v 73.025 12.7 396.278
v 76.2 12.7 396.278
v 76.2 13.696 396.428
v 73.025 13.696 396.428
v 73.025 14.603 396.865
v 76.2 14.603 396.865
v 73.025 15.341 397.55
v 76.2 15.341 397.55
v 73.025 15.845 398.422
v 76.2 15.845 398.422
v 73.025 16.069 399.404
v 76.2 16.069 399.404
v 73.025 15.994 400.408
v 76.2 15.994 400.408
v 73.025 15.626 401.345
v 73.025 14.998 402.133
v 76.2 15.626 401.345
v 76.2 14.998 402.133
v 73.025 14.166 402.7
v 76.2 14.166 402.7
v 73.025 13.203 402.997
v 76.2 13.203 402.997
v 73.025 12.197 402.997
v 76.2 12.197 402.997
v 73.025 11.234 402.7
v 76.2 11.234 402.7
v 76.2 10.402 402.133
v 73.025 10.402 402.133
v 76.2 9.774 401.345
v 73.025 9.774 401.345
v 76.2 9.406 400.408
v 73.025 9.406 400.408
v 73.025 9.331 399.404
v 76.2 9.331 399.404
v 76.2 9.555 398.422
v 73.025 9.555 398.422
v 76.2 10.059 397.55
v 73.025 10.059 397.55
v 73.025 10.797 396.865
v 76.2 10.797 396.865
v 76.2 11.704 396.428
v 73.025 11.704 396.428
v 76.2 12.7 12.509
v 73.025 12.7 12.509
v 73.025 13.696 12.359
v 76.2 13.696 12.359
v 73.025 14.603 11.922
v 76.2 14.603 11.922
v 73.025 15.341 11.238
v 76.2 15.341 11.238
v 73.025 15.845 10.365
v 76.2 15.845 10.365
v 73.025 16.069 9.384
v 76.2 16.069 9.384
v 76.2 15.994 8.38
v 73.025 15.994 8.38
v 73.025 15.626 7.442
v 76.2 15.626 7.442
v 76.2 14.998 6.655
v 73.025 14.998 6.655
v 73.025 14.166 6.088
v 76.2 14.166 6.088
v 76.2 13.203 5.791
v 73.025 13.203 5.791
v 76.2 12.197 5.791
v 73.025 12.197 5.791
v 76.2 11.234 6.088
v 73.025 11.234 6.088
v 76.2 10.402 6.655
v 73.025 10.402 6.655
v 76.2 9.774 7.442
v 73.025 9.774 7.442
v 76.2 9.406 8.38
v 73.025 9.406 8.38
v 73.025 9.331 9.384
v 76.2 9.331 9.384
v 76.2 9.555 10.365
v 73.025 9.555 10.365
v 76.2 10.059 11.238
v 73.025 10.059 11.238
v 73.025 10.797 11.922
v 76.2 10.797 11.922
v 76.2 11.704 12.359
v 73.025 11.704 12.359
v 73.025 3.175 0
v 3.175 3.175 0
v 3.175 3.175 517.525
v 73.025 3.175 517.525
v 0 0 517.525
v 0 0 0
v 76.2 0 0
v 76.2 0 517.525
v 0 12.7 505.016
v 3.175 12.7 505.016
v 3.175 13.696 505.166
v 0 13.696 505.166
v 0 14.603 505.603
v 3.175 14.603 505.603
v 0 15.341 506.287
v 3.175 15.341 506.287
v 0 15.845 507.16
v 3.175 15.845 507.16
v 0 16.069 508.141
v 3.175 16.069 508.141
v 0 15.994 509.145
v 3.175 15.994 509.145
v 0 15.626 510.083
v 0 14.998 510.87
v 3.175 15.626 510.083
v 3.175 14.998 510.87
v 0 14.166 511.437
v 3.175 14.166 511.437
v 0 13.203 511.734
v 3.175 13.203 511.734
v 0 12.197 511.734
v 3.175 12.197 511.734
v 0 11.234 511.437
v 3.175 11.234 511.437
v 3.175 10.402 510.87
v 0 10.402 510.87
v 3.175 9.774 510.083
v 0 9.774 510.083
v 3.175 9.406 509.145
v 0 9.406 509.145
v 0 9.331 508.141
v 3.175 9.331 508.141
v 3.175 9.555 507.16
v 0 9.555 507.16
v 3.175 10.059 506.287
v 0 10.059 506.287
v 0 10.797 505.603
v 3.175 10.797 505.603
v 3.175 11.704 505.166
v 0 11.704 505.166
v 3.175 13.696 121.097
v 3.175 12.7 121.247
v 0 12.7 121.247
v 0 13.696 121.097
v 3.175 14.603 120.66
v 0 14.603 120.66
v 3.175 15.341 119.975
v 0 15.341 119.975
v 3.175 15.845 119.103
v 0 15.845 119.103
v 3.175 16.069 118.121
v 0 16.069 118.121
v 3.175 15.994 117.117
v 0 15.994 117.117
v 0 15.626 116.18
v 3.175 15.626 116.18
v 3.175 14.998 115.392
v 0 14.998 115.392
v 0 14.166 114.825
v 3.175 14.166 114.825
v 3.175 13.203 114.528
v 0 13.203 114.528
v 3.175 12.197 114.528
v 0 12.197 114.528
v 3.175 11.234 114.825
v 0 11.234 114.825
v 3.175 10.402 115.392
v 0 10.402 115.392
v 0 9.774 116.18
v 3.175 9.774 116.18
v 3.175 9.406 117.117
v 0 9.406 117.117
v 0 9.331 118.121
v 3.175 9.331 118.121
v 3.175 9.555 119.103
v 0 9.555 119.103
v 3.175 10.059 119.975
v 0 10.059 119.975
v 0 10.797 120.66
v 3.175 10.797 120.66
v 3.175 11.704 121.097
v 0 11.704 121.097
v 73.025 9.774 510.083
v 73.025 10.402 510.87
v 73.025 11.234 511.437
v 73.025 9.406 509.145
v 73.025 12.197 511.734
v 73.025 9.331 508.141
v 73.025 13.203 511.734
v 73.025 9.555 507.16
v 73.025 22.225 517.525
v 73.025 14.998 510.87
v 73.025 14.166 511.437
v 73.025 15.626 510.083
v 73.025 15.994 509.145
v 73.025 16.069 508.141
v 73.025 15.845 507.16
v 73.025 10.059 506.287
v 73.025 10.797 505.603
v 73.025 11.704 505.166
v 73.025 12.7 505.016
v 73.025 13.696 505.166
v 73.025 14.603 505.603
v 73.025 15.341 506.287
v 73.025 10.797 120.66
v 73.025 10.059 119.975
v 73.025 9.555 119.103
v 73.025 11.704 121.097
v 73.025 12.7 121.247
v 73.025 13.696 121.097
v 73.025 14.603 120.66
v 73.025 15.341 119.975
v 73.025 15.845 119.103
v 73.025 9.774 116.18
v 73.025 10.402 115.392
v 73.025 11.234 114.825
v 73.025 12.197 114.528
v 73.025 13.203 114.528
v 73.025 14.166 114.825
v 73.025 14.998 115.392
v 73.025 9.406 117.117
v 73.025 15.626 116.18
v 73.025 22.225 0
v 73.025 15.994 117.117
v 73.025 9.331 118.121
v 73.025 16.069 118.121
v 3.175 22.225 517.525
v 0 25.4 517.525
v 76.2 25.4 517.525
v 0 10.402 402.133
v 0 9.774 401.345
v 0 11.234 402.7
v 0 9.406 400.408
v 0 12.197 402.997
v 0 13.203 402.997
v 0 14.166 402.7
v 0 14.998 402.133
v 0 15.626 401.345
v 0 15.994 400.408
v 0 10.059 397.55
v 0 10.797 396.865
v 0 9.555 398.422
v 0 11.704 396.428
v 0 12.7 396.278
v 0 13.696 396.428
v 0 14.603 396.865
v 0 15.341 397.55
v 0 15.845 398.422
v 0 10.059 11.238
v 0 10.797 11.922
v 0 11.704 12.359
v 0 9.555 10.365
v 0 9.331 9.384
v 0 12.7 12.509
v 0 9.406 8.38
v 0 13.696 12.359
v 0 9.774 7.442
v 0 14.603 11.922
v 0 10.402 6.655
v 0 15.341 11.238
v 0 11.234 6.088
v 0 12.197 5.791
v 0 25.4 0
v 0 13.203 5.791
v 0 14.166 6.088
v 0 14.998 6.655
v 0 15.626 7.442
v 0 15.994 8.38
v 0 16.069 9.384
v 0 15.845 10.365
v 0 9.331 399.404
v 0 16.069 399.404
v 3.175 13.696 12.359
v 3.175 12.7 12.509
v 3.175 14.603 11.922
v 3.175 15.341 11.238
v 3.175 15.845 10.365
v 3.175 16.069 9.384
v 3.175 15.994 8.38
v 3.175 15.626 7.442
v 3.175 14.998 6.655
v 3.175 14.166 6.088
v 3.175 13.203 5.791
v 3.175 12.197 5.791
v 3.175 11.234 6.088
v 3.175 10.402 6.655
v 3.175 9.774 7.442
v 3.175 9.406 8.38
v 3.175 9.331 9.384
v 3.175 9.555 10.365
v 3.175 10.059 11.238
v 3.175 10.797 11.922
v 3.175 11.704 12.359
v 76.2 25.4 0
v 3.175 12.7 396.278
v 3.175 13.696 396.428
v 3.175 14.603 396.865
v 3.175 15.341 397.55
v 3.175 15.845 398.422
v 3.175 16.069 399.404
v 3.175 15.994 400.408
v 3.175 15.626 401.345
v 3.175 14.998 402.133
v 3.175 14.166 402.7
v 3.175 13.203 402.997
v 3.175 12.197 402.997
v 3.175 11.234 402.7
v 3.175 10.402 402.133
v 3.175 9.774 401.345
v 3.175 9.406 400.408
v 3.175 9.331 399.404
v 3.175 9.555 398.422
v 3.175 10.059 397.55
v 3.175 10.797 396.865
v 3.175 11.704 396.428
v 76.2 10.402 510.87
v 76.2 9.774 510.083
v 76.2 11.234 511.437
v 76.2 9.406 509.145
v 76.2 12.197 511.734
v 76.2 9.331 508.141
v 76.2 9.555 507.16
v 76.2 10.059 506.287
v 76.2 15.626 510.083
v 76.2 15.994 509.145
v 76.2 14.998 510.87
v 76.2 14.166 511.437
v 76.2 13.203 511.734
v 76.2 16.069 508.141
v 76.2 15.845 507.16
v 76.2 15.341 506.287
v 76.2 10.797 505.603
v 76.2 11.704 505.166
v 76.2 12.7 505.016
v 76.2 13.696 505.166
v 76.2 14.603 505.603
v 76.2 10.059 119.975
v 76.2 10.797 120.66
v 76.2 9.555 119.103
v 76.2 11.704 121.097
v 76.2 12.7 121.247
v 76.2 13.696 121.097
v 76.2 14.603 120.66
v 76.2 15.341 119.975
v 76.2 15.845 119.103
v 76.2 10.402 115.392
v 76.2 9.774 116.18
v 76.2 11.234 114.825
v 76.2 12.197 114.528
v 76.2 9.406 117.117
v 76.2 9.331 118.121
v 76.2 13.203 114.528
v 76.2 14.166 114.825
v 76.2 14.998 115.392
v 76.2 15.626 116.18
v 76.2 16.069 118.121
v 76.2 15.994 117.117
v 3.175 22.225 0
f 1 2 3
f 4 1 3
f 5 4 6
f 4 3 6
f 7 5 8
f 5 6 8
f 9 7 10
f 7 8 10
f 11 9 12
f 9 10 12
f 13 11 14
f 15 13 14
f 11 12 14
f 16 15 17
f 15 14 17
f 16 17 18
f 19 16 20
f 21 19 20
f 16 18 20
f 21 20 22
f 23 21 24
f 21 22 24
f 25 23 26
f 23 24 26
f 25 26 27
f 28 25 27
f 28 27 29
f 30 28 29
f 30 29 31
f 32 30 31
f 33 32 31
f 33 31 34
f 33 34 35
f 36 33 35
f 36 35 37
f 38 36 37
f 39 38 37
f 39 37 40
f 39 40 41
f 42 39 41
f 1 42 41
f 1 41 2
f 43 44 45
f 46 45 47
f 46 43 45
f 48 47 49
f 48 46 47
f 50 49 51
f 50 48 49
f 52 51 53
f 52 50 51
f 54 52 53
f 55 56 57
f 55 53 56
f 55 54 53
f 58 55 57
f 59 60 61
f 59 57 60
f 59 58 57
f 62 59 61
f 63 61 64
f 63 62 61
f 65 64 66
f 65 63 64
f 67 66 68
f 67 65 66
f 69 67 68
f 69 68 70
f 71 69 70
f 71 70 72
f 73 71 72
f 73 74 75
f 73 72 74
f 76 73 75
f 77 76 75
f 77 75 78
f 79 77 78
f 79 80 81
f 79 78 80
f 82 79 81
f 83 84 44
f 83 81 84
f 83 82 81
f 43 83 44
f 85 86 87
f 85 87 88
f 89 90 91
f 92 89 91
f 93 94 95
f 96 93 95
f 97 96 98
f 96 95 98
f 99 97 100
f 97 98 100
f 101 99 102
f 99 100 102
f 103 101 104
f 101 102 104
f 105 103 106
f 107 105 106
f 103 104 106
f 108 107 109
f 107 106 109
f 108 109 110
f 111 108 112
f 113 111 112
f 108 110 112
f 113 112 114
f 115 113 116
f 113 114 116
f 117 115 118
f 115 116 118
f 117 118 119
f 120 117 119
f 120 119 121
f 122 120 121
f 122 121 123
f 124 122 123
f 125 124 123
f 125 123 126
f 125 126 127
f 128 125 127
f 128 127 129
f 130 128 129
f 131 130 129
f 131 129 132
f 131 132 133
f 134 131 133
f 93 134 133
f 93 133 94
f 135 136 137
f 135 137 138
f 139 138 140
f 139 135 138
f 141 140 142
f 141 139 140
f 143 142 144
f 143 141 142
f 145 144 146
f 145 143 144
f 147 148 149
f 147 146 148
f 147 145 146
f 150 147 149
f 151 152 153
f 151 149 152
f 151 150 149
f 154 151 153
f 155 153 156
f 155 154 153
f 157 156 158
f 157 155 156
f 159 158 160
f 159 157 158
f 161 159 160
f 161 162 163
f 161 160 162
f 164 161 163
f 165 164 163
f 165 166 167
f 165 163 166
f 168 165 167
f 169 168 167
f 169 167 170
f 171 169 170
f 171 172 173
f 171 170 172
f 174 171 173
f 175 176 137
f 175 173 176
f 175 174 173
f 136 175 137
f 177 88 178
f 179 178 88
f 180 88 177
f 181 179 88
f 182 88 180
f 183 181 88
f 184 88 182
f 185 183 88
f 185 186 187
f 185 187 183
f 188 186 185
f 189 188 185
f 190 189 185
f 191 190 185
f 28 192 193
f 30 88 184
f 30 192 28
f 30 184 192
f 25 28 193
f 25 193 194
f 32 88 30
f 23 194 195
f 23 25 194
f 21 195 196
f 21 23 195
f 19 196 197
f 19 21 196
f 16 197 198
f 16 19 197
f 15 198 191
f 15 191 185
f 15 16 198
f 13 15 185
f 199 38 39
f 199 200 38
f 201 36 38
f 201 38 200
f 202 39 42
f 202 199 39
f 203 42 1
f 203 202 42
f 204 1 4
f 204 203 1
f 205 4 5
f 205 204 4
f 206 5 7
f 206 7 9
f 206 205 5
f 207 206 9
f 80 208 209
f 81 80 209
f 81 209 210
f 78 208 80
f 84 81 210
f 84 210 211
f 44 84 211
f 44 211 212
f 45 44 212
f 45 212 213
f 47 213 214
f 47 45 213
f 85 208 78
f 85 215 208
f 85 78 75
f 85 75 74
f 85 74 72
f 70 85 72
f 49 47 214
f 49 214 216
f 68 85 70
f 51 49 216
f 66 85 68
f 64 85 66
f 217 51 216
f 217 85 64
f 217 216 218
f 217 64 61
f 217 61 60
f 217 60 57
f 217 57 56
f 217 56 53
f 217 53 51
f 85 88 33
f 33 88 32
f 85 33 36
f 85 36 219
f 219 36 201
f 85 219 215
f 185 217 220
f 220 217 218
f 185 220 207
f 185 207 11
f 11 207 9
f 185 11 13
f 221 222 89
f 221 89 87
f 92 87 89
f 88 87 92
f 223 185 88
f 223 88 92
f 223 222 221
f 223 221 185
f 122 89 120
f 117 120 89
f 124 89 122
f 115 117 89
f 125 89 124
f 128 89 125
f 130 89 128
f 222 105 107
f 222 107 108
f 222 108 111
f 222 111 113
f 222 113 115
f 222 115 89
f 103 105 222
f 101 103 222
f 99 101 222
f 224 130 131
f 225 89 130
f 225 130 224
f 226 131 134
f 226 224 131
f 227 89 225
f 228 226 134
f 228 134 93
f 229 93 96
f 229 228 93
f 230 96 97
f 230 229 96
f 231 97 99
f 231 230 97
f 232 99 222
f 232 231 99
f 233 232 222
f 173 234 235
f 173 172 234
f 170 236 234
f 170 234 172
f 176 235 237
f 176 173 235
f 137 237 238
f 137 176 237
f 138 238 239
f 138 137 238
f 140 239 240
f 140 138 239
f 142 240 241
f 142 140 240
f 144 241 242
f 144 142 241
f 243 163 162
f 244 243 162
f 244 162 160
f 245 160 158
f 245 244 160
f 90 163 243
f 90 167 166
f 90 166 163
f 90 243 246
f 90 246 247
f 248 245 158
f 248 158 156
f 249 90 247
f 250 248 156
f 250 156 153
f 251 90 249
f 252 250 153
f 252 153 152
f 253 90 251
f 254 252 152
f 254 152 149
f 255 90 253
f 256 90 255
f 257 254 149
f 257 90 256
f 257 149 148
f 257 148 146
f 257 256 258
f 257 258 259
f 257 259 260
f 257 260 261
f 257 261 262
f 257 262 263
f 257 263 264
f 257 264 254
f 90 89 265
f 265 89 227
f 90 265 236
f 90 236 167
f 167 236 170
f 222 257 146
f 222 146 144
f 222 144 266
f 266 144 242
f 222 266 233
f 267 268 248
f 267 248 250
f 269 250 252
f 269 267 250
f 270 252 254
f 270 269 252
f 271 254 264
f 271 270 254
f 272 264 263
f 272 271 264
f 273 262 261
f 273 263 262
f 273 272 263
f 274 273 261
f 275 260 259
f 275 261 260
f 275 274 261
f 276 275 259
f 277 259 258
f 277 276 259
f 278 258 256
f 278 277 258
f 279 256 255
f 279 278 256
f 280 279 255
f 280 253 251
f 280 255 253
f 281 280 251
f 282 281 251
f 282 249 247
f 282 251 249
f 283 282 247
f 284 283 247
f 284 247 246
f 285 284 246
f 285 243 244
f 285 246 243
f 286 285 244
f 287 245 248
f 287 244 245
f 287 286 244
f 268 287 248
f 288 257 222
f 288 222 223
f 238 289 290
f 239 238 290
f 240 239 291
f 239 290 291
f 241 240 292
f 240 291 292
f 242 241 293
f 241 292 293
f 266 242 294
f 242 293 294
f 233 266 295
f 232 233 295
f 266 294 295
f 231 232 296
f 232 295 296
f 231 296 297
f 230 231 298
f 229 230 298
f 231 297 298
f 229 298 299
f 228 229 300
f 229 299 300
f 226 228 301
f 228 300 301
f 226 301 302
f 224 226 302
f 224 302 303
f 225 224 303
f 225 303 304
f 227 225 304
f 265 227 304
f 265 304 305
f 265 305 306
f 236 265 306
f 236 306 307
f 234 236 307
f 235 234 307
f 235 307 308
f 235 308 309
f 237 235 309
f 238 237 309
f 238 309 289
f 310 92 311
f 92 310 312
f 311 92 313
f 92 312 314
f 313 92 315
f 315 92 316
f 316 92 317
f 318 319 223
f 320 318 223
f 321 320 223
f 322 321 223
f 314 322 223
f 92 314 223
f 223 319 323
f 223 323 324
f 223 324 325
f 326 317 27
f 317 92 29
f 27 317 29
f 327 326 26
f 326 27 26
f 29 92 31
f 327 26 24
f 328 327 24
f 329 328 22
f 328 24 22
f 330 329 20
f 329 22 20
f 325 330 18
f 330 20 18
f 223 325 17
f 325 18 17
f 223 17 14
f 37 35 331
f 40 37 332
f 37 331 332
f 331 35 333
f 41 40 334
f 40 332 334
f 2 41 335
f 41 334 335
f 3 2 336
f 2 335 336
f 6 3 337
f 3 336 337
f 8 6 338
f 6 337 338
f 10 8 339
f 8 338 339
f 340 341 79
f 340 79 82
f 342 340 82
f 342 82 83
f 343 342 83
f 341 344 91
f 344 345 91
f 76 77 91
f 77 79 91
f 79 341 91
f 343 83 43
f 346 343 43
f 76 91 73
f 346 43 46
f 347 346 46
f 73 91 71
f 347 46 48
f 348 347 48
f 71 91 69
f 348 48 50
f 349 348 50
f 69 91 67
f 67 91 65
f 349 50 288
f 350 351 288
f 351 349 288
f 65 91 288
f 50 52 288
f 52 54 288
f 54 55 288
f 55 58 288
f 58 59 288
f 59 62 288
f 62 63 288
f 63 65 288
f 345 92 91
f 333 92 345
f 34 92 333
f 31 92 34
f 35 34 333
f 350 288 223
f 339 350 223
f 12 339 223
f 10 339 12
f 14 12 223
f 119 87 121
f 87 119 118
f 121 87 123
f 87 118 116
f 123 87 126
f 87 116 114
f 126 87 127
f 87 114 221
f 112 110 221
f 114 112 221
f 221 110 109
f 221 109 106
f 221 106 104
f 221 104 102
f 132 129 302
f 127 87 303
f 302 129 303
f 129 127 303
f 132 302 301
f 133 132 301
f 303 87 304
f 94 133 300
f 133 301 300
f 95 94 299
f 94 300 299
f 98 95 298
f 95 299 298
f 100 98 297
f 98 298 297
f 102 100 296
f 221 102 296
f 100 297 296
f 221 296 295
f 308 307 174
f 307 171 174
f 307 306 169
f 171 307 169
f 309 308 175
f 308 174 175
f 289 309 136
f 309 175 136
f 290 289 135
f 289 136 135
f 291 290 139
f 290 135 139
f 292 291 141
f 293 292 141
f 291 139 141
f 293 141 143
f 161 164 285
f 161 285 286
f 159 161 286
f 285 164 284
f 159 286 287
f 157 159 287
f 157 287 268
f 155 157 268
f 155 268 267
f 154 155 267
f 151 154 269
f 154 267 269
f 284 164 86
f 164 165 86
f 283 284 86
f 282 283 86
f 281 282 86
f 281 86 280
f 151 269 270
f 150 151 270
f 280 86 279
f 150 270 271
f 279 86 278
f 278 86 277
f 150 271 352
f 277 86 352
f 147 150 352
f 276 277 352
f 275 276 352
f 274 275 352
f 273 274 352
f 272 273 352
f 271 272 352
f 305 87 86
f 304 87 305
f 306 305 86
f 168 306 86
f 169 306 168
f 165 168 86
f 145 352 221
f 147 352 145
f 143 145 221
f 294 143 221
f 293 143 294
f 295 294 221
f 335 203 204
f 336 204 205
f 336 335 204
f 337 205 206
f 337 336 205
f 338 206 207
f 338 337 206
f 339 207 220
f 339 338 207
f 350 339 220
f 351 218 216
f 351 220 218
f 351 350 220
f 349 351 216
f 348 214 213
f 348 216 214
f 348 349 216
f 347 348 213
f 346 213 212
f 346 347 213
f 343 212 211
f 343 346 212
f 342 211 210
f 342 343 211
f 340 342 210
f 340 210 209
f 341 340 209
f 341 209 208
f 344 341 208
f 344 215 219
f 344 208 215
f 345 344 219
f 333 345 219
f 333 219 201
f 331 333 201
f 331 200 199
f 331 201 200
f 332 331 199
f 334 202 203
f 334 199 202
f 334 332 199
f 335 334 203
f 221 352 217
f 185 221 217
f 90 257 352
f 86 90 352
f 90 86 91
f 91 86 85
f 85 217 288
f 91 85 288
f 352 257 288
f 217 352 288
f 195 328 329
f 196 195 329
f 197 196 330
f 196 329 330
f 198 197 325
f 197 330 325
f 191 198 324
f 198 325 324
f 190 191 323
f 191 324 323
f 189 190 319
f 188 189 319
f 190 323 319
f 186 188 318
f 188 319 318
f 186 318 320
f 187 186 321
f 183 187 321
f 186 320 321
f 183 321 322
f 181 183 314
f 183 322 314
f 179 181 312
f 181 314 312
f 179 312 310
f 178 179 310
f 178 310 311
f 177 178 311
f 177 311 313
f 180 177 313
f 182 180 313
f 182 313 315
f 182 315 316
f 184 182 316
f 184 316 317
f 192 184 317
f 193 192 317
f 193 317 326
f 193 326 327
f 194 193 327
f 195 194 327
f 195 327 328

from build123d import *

# Parameters (mm, degrees)
SKETCH1_W           = 76.2
SKETCH1_H           = 25.4
SKETCH1_W_2         = 69.85
SKETCH1_H_2         = 19.05
BOSS_EXTRUDE1_DEPTH = 517.525
SKETCH3_R           = 3.3782
CUT_EXTRUDE1_DEPTH  = 77.2


with BuildPart() as part:
    # Sketch1 → Boss-Extrude1 (new body)
    with BuildSketch(Plane.XY):
        with Locations((38.1, 12.7)):
            Rectangle(SKETCH1_W, SKETCH1_H)
        with Locations((38.1, 12.7)):
            Rectangle(SKETCH1_W_2, SKETCH1_H_2, mode=Mode.SUBTRACT)
    extrude(amount=BOSS_EXTRUDE1_DEPTH)

    # Sketch3 → Cut-Extrude1 (cut, through all)
    with BuildSketch(Plane(origin=(76.2, 0, 0), x_dir=(0, 0, -1), z_dir=(1, 0, 0))):
        with Locations((-508.3937, 12.7)):
            Circle(SKETCH3_R)
        with Locations((-399.6563, 12.7)):
            Circle(SKETCH3_R)
    cut_extrude1 = extrude(amount=-CUT_EXTRUDE1_DEPTH, mode=Mode.SUBTRACT)

    # Mirror1: Cut-Extrude1 across plane
    add(cut_extrude1.mirror(Plane(origin=(0, 0, 258.7625), x_dir=(1, 0, 0), z_dir=(0, 0, -1))), mode=Mode.SUBTRACT)


solid = part.part
